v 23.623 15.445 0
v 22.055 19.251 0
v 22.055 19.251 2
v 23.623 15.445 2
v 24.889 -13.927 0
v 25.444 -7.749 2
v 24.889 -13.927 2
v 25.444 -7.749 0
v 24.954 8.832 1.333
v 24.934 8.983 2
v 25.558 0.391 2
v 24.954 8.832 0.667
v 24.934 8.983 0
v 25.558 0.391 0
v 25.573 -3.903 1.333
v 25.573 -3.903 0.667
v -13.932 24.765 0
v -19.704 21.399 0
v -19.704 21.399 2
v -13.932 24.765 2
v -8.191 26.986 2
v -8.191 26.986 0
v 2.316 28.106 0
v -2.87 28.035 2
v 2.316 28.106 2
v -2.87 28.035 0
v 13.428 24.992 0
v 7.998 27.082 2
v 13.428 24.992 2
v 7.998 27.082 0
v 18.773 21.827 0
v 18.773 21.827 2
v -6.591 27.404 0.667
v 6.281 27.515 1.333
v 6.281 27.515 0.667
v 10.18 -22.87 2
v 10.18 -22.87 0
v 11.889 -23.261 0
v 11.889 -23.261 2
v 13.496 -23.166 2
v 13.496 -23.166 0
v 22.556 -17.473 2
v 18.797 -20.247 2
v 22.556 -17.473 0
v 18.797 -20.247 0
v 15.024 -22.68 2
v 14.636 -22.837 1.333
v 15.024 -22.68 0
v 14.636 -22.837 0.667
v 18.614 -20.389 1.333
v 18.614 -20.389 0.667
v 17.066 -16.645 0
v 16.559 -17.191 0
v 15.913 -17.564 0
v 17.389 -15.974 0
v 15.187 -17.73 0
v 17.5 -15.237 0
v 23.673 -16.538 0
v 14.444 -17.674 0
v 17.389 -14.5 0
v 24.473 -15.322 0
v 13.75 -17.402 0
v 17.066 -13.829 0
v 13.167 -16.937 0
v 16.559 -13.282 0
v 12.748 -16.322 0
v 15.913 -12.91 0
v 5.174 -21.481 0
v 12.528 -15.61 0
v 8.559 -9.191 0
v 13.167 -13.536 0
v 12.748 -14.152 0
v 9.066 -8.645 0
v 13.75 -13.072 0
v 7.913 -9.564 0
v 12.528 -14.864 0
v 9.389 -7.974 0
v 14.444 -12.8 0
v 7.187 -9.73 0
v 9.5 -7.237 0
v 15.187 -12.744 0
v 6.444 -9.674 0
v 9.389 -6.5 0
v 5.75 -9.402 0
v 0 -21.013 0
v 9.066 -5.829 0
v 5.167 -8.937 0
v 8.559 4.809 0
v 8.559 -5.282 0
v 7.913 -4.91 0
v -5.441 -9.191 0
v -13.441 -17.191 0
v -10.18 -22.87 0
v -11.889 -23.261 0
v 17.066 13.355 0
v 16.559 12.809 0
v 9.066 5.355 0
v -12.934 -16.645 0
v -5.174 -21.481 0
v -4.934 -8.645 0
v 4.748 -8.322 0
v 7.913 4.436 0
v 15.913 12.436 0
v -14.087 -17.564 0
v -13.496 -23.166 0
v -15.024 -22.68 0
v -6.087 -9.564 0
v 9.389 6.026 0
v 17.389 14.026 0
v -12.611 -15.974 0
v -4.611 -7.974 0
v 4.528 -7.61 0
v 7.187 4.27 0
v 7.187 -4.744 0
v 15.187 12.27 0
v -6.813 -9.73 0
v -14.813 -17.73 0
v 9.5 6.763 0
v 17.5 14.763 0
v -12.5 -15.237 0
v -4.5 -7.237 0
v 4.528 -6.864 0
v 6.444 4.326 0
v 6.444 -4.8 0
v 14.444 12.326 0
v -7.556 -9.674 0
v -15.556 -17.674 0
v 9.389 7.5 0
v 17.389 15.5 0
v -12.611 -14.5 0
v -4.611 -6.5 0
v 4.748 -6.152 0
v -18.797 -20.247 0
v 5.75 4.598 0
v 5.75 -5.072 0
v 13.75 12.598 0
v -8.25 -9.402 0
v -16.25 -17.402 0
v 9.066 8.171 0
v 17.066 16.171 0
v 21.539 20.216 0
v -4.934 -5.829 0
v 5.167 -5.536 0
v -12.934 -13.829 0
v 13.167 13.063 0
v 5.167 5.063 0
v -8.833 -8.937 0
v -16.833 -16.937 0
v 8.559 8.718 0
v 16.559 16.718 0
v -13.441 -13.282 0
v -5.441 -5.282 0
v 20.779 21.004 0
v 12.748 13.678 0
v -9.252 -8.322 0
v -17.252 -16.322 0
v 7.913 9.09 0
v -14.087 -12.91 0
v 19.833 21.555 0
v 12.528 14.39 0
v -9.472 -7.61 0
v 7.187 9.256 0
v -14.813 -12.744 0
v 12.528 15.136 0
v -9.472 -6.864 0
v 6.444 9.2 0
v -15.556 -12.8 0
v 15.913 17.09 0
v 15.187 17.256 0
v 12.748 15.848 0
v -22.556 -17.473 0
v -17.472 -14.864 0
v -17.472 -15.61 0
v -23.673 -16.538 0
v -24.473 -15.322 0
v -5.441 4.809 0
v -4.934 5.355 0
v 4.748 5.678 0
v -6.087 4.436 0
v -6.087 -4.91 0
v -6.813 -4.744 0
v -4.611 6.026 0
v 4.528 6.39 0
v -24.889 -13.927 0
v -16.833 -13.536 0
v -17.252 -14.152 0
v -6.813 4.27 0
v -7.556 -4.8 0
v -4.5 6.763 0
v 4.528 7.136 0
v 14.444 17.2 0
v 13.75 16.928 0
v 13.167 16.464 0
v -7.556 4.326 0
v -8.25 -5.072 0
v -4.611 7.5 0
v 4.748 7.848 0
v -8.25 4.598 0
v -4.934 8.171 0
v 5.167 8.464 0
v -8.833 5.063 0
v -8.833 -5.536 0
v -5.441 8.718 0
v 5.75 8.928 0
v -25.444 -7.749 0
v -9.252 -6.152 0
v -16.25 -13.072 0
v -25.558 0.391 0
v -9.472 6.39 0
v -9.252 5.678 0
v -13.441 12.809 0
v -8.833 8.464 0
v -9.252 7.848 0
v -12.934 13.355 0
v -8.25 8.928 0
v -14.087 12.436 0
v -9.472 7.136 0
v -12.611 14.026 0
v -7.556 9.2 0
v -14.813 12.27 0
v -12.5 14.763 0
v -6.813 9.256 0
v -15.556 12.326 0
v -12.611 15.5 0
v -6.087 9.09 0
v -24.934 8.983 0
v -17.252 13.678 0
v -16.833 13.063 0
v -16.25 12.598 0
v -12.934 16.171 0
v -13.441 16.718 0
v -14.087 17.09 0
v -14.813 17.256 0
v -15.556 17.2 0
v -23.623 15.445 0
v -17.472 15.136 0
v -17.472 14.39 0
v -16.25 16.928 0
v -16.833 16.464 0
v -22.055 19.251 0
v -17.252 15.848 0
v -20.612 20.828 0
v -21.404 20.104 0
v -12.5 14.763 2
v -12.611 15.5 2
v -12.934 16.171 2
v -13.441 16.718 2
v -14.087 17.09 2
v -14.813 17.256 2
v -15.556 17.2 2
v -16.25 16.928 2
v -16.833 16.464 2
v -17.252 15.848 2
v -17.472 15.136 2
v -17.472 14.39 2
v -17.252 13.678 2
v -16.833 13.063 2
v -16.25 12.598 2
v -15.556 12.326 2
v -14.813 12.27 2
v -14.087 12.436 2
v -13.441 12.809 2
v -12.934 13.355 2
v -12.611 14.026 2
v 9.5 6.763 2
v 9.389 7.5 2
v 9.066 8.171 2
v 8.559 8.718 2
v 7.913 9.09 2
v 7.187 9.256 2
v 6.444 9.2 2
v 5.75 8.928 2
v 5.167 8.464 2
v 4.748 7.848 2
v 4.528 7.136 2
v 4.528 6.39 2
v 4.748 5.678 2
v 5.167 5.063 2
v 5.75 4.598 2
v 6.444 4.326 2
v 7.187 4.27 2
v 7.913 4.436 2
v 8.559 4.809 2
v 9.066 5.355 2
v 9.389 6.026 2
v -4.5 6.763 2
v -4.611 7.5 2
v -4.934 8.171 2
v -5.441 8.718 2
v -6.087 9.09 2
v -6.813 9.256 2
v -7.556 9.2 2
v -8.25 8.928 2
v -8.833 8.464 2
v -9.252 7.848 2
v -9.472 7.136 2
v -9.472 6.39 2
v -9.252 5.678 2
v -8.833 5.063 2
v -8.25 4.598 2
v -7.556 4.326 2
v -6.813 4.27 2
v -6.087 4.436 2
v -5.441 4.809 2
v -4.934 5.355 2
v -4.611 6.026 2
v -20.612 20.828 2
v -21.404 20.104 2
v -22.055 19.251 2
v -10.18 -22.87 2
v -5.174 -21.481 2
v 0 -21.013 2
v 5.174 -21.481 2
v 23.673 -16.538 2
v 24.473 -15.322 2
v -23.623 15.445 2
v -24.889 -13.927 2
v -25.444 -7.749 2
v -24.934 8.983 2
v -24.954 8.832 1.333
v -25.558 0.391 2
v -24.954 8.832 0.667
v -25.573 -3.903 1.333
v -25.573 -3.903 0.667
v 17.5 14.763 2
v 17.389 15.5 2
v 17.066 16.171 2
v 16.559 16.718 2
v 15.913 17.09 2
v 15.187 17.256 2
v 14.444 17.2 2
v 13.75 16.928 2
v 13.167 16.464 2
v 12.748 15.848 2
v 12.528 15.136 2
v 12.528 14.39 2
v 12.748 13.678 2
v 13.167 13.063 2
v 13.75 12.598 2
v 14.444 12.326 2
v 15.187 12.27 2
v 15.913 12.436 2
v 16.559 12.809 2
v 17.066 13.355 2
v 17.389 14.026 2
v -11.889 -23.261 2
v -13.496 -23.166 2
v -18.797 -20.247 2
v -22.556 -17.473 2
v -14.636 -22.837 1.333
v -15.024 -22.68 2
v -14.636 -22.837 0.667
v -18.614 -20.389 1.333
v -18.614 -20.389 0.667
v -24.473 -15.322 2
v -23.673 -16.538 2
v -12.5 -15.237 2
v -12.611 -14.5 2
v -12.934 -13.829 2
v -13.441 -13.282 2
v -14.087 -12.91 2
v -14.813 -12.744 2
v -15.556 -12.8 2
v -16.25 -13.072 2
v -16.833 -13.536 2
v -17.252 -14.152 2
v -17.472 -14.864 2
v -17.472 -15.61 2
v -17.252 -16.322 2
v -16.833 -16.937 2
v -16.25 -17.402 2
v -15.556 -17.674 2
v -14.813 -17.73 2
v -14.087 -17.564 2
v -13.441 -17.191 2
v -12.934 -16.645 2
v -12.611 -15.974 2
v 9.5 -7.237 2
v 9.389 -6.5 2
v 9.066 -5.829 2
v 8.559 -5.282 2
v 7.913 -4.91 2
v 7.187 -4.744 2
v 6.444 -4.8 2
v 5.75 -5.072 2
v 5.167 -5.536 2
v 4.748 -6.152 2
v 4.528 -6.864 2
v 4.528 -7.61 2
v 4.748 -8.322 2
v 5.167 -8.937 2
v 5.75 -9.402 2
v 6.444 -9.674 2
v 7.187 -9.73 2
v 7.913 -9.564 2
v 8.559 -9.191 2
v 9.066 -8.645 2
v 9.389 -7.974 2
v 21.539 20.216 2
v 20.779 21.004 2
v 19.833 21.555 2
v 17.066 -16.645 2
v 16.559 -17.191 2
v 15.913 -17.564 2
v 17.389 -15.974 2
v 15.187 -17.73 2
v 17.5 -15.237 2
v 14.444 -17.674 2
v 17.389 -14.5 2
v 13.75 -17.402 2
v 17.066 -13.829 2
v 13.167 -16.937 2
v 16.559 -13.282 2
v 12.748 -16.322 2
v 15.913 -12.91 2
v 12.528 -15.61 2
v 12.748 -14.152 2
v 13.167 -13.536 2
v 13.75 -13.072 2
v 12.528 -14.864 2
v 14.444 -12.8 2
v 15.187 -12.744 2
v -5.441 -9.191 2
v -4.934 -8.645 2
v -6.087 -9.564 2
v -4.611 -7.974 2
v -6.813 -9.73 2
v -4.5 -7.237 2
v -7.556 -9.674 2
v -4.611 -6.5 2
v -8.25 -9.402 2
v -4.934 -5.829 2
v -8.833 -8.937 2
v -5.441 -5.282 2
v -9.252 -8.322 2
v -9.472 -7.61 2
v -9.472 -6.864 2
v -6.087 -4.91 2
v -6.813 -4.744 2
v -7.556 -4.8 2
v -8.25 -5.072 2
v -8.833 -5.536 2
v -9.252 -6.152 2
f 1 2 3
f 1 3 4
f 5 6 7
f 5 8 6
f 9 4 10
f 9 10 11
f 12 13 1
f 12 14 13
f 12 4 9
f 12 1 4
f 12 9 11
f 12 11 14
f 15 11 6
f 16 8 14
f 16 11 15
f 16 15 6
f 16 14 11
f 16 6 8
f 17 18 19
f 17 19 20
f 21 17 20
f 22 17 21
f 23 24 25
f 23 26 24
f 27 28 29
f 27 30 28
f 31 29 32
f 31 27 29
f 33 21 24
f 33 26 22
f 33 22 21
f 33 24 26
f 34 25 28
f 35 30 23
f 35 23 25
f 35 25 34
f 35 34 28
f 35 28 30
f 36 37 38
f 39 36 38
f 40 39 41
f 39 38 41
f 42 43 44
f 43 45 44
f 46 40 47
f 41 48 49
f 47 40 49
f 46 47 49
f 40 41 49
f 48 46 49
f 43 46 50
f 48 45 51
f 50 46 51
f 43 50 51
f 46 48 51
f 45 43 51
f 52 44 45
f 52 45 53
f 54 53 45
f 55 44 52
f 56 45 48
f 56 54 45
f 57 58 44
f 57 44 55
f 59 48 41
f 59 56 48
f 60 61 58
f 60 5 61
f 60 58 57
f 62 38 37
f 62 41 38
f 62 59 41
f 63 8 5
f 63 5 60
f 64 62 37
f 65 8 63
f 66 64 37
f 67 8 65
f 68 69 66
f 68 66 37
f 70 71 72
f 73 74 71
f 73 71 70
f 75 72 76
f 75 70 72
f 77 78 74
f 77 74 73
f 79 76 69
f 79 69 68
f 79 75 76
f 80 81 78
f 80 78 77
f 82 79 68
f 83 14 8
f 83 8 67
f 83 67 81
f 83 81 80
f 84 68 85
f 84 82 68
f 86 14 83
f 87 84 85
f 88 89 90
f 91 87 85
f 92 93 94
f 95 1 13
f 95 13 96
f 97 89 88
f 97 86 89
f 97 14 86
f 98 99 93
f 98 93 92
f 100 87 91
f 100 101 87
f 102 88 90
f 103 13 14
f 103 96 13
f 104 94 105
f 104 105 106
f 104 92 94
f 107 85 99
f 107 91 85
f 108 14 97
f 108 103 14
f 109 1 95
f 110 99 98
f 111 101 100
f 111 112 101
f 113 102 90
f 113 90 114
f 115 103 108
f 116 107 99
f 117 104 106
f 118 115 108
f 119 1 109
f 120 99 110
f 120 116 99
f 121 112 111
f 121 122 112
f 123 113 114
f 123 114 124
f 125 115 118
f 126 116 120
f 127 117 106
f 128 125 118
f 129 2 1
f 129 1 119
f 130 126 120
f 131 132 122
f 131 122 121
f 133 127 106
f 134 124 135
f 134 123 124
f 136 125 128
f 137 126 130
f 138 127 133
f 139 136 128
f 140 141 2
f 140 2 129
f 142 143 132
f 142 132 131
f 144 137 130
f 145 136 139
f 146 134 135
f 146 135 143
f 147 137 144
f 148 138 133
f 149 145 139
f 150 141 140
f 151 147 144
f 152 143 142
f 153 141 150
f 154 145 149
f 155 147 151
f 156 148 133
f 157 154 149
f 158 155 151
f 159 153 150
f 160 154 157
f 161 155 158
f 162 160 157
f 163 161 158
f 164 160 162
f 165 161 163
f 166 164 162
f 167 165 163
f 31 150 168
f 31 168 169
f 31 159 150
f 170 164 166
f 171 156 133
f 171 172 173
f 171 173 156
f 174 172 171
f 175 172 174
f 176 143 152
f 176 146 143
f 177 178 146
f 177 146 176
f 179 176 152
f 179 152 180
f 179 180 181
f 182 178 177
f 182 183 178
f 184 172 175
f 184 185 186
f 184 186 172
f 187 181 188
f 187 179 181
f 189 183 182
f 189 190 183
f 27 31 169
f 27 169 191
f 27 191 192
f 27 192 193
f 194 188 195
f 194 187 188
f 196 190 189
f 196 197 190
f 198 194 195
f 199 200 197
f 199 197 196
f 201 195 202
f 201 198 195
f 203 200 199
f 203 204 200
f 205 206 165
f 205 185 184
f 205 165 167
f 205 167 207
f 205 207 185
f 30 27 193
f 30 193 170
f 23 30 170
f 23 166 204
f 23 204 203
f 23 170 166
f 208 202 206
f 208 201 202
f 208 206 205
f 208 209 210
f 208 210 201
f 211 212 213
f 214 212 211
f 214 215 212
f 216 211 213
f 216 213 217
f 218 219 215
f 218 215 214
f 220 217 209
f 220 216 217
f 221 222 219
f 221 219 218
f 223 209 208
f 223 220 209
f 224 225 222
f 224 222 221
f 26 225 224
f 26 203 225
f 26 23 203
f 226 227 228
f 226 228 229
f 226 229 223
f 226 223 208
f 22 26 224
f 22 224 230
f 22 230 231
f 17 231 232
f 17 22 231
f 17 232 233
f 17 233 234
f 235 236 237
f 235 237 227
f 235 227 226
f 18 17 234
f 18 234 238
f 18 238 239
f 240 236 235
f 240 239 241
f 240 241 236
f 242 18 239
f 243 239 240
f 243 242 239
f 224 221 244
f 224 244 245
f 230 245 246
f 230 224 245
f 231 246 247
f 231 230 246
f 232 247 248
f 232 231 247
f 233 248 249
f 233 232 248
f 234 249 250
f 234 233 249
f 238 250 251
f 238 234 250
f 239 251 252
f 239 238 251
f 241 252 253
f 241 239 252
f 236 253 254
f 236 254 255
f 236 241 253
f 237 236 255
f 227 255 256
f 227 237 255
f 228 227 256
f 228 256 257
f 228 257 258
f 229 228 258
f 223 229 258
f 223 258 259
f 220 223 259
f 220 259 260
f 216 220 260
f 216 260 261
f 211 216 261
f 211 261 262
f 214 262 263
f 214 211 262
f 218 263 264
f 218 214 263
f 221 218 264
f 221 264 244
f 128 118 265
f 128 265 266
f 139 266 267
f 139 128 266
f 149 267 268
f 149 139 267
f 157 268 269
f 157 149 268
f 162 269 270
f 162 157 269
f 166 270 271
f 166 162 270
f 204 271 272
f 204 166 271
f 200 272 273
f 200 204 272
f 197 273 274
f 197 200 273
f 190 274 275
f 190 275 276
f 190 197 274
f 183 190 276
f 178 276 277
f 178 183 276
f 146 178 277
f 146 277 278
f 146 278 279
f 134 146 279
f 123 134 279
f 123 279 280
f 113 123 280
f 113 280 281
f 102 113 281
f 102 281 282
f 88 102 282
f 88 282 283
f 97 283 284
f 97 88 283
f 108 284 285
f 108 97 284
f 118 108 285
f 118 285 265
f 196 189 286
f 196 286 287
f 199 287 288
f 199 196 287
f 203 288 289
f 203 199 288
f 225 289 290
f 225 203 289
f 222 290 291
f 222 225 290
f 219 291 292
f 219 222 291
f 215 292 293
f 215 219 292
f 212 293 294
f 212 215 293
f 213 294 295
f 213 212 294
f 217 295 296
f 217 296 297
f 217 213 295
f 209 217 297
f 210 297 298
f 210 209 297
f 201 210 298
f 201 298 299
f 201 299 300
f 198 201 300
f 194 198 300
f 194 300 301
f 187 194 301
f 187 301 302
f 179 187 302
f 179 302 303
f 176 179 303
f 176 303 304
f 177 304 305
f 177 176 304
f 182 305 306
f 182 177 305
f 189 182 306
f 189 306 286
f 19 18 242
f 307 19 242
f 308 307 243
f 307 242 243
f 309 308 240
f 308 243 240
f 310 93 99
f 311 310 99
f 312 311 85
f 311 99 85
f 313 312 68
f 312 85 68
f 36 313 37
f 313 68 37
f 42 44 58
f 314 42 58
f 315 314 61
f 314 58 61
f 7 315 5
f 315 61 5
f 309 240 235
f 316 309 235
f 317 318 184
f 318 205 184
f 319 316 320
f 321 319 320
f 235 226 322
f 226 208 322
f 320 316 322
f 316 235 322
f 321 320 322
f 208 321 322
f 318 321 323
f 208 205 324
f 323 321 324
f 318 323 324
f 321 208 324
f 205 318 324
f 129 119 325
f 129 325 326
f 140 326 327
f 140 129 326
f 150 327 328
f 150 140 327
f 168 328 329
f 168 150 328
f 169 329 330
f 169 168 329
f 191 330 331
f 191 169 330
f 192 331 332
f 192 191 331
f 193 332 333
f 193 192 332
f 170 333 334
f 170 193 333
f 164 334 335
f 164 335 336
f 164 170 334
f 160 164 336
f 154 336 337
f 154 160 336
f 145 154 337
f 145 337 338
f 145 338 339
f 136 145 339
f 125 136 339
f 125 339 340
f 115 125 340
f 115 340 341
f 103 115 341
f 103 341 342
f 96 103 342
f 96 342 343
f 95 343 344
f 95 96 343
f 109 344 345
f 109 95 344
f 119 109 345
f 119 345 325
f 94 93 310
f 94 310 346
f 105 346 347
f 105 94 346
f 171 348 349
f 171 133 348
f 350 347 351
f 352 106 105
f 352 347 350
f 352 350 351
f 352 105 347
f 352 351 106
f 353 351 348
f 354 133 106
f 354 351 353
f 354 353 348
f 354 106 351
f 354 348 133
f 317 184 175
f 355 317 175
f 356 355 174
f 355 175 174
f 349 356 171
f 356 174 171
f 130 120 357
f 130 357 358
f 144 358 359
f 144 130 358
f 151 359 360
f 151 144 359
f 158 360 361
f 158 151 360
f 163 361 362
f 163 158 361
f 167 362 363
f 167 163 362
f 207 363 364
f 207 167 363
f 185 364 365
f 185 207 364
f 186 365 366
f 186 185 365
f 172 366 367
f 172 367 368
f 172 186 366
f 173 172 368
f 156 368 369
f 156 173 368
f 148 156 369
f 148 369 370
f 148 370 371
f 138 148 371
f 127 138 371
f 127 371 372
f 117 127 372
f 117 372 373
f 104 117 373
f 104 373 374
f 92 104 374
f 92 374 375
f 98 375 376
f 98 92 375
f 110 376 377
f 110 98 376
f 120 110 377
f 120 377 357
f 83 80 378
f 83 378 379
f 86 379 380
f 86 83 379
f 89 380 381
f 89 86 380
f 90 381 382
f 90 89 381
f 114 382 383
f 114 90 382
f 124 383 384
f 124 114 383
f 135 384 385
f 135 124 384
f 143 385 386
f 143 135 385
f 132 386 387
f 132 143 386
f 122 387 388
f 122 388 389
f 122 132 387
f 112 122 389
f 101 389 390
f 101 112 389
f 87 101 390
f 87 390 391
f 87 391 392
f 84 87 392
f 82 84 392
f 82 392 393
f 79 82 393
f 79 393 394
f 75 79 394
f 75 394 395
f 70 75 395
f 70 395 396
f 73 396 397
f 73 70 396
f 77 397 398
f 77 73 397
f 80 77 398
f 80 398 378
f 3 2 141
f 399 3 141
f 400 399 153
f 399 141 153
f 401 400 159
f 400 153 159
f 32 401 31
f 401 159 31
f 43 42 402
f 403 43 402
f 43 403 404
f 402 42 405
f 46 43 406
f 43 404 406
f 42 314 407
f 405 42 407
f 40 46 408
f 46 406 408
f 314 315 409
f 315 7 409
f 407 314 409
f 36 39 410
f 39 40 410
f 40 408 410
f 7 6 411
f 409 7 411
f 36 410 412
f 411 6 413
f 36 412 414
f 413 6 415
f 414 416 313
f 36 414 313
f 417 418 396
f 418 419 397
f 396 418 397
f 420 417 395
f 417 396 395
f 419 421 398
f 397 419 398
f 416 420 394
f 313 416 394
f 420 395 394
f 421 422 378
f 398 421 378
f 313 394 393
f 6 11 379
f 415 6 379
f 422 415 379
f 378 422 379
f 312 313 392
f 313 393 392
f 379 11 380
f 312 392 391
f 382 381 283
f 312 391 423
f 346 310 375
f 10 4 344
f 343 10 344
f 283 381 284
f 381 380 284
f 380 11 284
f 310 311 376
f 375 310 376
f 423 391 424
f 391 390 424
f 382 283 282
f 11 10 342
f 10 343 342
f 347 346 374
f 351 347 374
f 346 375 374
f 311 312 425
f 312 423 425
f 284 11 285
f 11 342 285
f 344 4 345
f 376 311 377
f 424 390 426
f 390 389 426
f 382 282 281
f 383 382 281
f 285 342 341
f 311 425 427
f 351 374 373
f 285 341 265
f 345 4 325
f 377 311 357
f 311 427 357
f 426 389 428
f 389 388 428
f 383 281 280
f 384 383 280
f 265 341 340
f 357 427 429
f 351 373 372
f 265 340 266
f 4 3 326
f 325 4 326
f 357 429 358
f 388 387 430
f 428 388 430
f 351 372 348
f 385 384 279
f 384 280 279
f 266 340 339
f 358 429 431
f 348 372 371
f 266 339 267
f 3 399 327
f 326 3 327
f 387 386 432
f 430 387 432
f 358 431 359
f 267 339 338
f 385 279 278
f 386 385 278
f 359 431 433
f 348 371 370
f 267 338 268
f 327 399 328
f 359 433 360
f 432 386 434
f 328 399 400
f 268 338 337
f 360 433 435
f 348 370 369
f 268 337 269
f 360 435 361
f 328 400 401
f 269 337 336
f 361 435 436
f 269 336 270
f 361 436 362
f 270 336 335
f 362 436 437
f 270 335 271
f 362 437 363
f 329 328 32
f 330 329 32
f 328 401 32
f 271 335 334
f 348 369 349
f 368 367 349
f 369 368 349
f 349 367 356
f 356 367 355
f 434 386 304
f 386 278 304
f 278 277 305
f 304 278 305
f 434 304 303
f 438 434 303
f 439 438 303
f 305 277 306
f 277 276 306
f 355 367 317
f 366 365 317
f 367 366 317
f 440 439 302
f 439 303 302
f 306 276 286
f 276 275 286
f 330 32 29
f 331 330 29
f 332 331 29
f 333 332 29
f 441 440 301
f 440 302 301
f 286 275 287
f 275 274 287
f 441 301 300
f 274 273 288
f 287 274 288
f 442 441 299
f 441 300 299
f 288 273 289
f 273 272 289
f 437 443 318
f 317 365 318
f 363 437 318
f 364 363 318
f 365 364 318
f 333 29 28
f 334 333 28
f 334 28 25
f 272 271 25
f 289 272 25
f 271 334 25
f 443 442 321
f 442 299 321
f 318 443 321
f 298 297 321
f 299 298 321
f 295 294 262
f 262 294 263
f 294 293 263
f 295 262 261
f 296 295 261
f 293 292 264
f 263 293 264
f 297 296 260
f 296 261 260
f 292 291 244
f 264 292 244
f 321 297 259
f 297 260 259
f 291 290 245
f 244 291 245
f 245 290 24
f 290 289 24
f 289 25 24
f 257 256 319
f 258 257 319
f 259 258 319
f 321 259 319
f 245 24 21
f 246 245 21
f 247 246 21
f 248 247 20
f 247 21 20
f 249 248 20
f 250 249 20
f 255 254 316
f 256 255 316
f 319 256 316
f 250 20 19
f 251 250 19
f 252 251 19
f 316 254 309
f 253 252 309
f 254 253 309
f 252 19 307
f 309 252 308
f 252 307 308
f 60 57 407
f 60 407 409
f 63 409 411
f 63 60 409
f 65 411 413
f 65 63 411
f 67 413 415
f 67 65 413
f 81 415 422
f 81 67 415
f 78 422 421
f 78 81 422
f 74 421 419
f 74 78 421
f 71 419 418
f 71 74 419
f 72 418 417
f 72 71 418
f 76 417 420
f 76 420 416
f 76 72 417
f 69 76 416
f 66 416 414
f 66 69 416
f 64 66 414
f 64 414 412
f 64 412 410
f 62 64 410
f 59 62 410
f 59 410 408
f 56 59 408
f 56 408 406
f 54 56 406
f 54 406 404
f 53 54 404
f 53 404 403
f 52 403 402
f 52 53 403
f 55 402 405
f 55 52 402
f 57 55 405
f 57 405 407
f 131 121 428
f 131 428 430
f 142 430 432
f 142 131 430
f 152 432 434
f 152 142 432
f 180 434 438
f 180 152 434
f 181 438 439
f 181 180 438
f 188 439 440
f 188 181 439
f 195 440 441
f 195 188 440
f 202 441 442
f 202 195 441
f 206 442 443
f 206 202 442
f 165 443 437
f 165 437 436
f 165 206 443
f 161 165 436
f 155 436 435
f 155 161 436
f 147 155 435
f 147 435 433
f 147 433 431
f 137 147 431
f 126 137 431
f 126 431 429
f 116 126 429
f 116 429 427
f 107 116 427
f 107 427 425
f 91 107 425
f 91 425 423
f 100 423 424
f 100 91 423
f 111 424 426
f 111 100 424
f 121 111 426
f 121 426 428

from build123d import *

# Parameters (mm, degrees)
F0_R     = 2.5
F1_DEPTH = 2


with BuildPart() as f1:
    # F0 (on Top) → F1 (new body)
    with BuildSketch(Plane.XY):
        with BuildLine():
            add(Edge.make_bspline(
                [(-19.704321, 21.398848), (-6.516069, 30.382996), (6.516069, 30.382996), (18.773205, 21.827396)],
                knots=[0, 0, 0, 0, 38.479913, 38.479913, 38.479913, 38.479913], degree=3))
            ThreePointArc((-19.704321, 21.398848), (-21.024547, 20.4837), (-22.054647, 19.251066))
            add(Edge.make_bspline(
                [(-22.054647, 19.251066), (-26.418865, 11.664507), (-25.900009, -6.933015), (-24.88908, -13.926778)],
                knots=[0, 0, 0, 0, 29.282142, 29.282142, 29.282142, 29.282142], degree=3))
            ThreePointArc((-24.88908, -13.926778), (-24.117585, -15.959575), (-22.556211, -17.472709))
            add(Edge.make_bspline(
                [(-10.180056, -22.870327), (-15.022858, -24.695323), (-18.484277, -19.972211), (-22.556211, -17.472709)],
                knots=[0, 0, 0, 0, 13.563984, 13.563984, 13.563984, 13.563984], degree=3))
            ThreePointArc((-10.180056, -22.870327), (0, -21.013477), (10.180056, -22.870327))
            add(Edge.make_bspline(
                [(10.180056, -22.870327), (15.022858, -24.695323), (18.484277, -19.972211), (22.556211, -17.472709)],
                knots=[0, 0, 0, 0, 13.563984, 13.563984, 13.563984, 13.563984], degree=3))
            ThreePointArc((22.556211, -17.472709), (24.117585, -15.959575), (24.88908, -13.926778))
            add(Edge.make_bspline(
                [(22.054647, 19.251066), (26.418865, 11.664507), (25.900009, -6.933015), (24.88908, -13.926778)],
                knots=[0, 0, 0, 0, 29.282142, 29.282142, 29.282142, 29.282142], degree=3))
            ThreePointArc((22.054647, 19.251066), (20.7792, 21.004476), (18.773205, 21.827396))
        make_face()
        with Locations((-15, -15.236906)):
            Circle(F0_R, mode=Mode.SUBTRACT)
        with Locations((-7, -7.236906)):
            Circle(F0_R, mode=Mode.SUBTRACT)
        with Locations((15, -15.236906)):
            Circle(F0_R, mode=Mode.SUBTRACT)
        with Locations((7, -7.236906)):
            Circle(F0_R, mode=Mode.SUBTRACT)
        with Locations((-15, 14.763094)):
            Circle(F0_R, mode=Mode.SUBTRACT)
        with Locations((-7, 6.763094)):
            Circle(F0_R, mode=Mode.SUBTRACT)
        with Locations((7, 6.763094)):
            Circle(F0_R, mode=Mode.SUBTRACT)
        with Locations((15, 14.763094)):
            Circle(F0_R, mode=Mode.SUBTRACT)
    extrude(amount=F1_DEPTH)


solid = f1.part
